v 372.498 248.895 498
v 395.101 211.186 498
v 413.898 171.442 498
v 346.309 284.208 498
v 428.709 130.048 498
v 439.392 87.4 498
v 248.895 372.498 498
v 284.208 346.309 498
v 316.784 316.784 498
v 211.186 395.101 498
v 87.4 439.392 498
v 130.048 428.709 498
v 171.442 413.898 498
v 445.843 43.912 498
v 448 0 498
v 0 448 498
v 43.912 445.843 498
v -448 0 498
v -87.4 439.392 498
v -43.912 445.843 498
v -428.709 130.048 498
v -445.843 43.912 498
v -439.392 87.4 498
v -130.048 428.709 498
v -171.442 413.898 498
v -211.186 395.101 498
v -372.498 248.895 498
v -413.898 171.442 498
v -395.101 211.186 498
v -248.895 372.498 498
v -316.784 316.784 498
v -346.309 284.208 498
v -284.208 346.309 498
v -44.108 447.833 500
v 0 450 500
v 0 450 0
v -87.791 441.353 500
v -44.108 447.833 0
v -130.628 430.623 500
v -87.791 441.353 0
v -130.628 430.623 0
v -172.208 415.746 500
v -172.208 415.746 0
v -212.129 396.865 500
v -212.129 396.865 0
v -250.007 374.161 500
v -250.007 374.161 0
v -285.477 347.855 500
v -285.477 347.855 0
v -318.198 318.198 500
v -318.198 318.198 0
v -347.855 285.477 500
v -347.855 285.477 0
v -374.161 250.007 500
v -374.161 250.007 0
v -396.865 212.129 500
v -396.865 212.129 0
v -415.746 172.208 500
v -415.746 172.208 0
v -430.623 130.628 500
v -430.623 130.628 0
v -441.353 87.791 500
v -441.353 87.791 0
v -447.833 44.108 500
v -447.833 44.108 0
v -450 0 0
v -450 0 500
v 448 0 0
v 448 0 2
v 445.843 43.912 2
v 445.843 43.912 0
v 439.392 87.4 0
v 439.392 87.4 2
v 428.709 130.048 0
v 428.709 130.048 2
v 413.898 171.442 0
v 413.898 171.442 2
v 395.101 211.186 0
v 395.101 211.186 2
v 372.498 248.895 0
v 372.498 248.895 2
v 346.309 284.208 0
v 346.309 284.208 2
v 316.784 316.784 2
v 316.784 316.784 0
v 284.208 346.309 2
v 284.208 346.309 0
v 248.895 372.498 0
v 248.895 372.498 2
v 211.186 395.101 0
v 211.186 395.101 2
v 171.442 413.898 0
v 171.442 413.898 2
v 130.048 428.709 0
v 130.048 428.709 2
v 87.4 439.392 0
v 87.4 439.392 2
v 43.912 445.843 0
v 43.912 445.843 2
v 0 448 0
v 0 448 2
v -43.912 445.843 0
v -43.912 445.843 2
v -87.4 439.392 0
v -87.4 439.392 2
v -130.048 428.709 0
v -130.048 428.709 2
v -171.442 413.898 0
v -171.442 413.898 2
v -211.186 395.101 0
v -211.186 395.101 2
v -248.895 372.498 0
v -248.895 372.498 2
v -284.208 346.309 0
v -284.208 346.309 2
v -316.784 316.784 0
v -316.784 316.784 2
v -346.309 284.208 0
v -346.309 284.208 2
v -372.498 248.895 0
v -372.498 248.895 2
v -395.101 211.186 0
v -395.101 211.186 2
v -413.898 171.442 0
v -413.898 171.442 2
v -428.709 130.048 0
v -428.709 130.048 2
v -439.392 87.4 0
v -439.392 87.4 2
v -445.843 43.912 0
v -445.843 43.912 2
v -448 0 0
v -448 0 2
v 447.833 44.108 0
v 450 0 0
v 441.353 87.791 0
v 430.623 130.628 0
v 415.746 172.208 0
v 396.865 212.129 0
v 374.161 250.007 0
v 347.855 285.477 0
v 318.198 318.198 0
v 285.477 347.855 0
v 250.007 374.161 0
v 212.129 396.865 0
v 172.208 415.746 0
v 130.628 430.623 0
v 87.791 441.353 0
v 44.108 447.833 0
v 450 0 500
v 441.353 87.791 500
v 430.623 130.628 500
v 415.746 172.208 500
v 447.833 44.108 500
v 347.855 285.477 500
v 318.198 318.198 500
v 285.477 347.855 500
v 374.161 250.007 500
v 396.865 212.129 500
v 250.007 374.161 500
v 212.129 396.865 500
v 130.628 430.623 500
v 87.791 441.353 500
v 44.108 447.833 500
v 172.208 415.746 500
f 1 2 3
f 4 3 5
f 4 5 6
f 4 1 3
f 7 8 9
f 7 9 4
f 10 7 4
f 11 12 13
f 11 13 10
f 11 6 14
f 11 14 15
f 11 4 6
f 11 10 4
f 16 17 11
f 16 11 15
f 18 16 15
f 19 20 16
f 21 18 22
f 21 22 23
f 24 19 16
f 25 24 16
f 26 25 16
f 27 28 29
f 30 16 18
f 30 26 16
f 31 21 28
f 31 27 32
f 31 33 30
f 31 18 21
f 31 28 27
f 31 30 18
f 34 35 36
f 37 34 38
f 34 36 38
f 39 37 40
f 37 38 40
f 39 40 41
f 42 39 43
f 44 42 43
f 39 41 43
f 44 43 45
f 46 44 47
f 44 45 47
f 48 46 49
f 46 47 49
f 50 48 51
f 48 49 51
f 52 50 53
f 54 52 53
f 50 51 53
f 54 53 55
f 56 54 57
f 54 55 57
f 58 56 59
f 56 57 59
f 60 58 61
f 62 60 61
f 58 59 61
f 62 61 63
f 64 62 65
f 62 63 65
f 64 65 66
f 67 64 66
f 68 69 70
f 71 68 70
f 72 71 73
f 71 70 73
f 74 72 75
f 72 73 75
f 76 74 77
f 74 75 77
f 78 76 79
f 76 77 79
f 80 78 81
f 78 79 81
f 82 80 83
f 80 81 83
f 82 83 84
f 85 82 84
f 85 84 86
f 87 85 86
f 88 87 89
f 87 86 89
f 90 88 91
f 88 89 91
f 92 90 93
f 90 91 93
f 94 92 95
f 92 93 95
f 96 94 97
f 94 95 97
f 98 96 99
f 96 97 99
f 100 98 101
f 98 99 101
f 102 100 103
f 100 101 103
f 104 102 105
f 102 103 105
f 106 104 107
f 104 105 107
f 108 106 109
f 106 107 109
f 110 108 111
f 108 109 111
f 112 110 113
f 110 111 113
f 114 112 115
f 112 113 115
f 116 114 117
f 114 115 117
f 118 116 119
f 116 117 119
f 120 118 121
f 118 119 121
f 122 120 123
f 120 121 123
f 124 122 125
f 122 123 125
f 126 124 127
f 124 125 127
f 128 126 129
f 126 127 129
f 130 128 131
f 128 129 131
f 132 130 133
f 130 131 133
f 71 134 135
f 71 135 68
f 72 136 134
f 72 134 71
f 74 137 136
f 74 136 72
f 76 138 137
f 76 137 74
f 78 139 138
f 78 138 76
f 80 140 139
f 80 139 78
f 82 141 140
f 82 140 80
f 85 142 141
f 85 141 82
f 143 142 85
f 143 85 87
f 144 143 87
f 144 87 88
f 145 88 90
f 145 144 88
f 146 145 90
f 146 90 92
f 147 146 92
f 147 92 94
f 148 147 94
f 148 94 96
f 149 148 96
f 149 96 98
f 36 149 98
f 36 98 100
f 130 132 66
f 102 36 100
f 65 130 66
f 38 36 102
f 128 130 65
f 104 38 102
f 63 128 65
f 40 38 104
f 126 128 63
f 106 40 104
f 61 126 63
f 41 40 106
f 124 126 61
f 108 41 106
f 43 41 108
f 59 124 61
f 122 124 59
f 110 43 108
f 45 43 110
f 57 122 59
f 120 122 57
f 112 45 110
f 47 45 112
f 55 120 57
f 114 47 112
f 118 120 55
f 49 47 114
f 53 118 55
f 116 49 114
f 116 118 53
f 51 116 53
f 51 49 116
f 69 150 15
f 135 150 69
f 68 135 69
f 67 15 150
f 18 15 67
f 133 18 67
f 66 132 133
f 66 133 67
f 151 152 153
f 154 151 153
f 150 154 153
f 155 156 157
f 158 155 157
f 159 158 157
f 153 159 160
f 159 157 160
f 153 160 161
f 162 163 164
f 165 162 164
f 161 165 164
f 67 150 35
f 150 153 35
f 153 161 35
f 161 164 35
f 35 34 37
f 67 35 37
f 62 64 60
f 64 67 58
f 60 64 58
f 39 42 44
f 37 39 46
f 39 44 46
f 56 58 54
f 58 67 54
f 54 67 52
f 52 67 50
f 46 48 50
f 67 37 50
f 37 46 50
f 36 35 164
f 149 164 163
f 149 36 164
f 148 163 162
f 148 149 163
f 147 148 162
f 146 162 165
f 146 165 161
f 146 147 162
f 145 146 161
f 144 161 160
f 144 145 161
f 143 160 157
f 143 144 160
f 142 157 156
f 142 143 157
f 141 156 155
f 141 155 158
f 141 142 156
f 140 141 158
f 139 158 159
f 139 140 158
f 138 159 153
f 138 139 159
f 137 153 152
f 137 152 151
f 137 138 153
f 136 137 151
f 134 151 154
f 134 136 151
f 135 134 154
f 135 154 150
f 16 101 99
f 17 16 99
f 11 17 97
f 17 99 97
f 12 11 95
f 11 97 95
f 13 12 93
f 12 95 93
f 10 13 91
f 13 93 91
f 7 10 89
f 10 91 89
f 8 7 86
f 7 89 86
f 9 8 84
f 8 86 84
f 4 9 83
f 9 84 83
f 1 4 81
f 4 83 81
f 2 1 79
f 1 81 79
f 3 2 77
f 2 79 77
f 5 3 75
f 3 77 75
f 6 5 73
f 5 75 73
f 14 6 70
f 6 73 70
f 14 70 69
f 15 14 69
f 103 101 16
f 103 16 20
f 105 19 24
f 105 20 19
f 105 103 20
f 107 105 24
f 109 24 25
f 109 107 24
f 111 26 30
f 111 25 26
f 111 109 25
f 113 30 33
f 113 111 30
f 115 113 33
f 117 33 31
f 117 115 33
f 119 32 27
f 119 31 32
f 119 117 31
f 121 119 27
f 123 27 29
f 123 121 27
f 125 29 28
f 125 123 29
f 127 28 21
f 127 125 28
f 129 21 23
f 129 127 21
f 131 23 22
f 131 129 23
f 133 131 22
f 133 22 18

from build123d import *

# Parameters (mm, degrees)
F1_DEPTH = 500
F3_T     = -2
F5_DEPTH = 2


with BuildPart() as f1:
    # F0 (on Top) → F1 (new body)
    with BuildSketch(Plane.XY):
        with BuildLine():
            Line((-450, 0), (0, 0))
            Line((0, 0), (0, 450))
            ThreePointArc((0, 450), (-318.198052, 318.198052), (-450, 0))
        make_face()
    extrude(amount=F1_DEPTH)

    # F2: F1 across plane


with BuildPart() as f1_1:
    add(f1.part)
    add(f1.part.mirror(Plane.YZ))

    # F3
    f3_openings = [f1_1.faces().sort_by_distance(p)[0] for p in [
        (0, 0, 250),
    ]]
    offset(amount=F3_T, openings=f3_openings)

    # F4 (on face) → F5 (cut, through all)
    with BuildSketch(Plane.XY.offset(2)):
        with BuildLine():
            ThreePointArc((448, 0), (0, 448), (-448, 0))
            Line((-448, 0), (448, 0))
        make_face()
    extrude(amount=-F5_DEPTH, mode=Mode.SUBTRACT)


solid = f1_1.part
